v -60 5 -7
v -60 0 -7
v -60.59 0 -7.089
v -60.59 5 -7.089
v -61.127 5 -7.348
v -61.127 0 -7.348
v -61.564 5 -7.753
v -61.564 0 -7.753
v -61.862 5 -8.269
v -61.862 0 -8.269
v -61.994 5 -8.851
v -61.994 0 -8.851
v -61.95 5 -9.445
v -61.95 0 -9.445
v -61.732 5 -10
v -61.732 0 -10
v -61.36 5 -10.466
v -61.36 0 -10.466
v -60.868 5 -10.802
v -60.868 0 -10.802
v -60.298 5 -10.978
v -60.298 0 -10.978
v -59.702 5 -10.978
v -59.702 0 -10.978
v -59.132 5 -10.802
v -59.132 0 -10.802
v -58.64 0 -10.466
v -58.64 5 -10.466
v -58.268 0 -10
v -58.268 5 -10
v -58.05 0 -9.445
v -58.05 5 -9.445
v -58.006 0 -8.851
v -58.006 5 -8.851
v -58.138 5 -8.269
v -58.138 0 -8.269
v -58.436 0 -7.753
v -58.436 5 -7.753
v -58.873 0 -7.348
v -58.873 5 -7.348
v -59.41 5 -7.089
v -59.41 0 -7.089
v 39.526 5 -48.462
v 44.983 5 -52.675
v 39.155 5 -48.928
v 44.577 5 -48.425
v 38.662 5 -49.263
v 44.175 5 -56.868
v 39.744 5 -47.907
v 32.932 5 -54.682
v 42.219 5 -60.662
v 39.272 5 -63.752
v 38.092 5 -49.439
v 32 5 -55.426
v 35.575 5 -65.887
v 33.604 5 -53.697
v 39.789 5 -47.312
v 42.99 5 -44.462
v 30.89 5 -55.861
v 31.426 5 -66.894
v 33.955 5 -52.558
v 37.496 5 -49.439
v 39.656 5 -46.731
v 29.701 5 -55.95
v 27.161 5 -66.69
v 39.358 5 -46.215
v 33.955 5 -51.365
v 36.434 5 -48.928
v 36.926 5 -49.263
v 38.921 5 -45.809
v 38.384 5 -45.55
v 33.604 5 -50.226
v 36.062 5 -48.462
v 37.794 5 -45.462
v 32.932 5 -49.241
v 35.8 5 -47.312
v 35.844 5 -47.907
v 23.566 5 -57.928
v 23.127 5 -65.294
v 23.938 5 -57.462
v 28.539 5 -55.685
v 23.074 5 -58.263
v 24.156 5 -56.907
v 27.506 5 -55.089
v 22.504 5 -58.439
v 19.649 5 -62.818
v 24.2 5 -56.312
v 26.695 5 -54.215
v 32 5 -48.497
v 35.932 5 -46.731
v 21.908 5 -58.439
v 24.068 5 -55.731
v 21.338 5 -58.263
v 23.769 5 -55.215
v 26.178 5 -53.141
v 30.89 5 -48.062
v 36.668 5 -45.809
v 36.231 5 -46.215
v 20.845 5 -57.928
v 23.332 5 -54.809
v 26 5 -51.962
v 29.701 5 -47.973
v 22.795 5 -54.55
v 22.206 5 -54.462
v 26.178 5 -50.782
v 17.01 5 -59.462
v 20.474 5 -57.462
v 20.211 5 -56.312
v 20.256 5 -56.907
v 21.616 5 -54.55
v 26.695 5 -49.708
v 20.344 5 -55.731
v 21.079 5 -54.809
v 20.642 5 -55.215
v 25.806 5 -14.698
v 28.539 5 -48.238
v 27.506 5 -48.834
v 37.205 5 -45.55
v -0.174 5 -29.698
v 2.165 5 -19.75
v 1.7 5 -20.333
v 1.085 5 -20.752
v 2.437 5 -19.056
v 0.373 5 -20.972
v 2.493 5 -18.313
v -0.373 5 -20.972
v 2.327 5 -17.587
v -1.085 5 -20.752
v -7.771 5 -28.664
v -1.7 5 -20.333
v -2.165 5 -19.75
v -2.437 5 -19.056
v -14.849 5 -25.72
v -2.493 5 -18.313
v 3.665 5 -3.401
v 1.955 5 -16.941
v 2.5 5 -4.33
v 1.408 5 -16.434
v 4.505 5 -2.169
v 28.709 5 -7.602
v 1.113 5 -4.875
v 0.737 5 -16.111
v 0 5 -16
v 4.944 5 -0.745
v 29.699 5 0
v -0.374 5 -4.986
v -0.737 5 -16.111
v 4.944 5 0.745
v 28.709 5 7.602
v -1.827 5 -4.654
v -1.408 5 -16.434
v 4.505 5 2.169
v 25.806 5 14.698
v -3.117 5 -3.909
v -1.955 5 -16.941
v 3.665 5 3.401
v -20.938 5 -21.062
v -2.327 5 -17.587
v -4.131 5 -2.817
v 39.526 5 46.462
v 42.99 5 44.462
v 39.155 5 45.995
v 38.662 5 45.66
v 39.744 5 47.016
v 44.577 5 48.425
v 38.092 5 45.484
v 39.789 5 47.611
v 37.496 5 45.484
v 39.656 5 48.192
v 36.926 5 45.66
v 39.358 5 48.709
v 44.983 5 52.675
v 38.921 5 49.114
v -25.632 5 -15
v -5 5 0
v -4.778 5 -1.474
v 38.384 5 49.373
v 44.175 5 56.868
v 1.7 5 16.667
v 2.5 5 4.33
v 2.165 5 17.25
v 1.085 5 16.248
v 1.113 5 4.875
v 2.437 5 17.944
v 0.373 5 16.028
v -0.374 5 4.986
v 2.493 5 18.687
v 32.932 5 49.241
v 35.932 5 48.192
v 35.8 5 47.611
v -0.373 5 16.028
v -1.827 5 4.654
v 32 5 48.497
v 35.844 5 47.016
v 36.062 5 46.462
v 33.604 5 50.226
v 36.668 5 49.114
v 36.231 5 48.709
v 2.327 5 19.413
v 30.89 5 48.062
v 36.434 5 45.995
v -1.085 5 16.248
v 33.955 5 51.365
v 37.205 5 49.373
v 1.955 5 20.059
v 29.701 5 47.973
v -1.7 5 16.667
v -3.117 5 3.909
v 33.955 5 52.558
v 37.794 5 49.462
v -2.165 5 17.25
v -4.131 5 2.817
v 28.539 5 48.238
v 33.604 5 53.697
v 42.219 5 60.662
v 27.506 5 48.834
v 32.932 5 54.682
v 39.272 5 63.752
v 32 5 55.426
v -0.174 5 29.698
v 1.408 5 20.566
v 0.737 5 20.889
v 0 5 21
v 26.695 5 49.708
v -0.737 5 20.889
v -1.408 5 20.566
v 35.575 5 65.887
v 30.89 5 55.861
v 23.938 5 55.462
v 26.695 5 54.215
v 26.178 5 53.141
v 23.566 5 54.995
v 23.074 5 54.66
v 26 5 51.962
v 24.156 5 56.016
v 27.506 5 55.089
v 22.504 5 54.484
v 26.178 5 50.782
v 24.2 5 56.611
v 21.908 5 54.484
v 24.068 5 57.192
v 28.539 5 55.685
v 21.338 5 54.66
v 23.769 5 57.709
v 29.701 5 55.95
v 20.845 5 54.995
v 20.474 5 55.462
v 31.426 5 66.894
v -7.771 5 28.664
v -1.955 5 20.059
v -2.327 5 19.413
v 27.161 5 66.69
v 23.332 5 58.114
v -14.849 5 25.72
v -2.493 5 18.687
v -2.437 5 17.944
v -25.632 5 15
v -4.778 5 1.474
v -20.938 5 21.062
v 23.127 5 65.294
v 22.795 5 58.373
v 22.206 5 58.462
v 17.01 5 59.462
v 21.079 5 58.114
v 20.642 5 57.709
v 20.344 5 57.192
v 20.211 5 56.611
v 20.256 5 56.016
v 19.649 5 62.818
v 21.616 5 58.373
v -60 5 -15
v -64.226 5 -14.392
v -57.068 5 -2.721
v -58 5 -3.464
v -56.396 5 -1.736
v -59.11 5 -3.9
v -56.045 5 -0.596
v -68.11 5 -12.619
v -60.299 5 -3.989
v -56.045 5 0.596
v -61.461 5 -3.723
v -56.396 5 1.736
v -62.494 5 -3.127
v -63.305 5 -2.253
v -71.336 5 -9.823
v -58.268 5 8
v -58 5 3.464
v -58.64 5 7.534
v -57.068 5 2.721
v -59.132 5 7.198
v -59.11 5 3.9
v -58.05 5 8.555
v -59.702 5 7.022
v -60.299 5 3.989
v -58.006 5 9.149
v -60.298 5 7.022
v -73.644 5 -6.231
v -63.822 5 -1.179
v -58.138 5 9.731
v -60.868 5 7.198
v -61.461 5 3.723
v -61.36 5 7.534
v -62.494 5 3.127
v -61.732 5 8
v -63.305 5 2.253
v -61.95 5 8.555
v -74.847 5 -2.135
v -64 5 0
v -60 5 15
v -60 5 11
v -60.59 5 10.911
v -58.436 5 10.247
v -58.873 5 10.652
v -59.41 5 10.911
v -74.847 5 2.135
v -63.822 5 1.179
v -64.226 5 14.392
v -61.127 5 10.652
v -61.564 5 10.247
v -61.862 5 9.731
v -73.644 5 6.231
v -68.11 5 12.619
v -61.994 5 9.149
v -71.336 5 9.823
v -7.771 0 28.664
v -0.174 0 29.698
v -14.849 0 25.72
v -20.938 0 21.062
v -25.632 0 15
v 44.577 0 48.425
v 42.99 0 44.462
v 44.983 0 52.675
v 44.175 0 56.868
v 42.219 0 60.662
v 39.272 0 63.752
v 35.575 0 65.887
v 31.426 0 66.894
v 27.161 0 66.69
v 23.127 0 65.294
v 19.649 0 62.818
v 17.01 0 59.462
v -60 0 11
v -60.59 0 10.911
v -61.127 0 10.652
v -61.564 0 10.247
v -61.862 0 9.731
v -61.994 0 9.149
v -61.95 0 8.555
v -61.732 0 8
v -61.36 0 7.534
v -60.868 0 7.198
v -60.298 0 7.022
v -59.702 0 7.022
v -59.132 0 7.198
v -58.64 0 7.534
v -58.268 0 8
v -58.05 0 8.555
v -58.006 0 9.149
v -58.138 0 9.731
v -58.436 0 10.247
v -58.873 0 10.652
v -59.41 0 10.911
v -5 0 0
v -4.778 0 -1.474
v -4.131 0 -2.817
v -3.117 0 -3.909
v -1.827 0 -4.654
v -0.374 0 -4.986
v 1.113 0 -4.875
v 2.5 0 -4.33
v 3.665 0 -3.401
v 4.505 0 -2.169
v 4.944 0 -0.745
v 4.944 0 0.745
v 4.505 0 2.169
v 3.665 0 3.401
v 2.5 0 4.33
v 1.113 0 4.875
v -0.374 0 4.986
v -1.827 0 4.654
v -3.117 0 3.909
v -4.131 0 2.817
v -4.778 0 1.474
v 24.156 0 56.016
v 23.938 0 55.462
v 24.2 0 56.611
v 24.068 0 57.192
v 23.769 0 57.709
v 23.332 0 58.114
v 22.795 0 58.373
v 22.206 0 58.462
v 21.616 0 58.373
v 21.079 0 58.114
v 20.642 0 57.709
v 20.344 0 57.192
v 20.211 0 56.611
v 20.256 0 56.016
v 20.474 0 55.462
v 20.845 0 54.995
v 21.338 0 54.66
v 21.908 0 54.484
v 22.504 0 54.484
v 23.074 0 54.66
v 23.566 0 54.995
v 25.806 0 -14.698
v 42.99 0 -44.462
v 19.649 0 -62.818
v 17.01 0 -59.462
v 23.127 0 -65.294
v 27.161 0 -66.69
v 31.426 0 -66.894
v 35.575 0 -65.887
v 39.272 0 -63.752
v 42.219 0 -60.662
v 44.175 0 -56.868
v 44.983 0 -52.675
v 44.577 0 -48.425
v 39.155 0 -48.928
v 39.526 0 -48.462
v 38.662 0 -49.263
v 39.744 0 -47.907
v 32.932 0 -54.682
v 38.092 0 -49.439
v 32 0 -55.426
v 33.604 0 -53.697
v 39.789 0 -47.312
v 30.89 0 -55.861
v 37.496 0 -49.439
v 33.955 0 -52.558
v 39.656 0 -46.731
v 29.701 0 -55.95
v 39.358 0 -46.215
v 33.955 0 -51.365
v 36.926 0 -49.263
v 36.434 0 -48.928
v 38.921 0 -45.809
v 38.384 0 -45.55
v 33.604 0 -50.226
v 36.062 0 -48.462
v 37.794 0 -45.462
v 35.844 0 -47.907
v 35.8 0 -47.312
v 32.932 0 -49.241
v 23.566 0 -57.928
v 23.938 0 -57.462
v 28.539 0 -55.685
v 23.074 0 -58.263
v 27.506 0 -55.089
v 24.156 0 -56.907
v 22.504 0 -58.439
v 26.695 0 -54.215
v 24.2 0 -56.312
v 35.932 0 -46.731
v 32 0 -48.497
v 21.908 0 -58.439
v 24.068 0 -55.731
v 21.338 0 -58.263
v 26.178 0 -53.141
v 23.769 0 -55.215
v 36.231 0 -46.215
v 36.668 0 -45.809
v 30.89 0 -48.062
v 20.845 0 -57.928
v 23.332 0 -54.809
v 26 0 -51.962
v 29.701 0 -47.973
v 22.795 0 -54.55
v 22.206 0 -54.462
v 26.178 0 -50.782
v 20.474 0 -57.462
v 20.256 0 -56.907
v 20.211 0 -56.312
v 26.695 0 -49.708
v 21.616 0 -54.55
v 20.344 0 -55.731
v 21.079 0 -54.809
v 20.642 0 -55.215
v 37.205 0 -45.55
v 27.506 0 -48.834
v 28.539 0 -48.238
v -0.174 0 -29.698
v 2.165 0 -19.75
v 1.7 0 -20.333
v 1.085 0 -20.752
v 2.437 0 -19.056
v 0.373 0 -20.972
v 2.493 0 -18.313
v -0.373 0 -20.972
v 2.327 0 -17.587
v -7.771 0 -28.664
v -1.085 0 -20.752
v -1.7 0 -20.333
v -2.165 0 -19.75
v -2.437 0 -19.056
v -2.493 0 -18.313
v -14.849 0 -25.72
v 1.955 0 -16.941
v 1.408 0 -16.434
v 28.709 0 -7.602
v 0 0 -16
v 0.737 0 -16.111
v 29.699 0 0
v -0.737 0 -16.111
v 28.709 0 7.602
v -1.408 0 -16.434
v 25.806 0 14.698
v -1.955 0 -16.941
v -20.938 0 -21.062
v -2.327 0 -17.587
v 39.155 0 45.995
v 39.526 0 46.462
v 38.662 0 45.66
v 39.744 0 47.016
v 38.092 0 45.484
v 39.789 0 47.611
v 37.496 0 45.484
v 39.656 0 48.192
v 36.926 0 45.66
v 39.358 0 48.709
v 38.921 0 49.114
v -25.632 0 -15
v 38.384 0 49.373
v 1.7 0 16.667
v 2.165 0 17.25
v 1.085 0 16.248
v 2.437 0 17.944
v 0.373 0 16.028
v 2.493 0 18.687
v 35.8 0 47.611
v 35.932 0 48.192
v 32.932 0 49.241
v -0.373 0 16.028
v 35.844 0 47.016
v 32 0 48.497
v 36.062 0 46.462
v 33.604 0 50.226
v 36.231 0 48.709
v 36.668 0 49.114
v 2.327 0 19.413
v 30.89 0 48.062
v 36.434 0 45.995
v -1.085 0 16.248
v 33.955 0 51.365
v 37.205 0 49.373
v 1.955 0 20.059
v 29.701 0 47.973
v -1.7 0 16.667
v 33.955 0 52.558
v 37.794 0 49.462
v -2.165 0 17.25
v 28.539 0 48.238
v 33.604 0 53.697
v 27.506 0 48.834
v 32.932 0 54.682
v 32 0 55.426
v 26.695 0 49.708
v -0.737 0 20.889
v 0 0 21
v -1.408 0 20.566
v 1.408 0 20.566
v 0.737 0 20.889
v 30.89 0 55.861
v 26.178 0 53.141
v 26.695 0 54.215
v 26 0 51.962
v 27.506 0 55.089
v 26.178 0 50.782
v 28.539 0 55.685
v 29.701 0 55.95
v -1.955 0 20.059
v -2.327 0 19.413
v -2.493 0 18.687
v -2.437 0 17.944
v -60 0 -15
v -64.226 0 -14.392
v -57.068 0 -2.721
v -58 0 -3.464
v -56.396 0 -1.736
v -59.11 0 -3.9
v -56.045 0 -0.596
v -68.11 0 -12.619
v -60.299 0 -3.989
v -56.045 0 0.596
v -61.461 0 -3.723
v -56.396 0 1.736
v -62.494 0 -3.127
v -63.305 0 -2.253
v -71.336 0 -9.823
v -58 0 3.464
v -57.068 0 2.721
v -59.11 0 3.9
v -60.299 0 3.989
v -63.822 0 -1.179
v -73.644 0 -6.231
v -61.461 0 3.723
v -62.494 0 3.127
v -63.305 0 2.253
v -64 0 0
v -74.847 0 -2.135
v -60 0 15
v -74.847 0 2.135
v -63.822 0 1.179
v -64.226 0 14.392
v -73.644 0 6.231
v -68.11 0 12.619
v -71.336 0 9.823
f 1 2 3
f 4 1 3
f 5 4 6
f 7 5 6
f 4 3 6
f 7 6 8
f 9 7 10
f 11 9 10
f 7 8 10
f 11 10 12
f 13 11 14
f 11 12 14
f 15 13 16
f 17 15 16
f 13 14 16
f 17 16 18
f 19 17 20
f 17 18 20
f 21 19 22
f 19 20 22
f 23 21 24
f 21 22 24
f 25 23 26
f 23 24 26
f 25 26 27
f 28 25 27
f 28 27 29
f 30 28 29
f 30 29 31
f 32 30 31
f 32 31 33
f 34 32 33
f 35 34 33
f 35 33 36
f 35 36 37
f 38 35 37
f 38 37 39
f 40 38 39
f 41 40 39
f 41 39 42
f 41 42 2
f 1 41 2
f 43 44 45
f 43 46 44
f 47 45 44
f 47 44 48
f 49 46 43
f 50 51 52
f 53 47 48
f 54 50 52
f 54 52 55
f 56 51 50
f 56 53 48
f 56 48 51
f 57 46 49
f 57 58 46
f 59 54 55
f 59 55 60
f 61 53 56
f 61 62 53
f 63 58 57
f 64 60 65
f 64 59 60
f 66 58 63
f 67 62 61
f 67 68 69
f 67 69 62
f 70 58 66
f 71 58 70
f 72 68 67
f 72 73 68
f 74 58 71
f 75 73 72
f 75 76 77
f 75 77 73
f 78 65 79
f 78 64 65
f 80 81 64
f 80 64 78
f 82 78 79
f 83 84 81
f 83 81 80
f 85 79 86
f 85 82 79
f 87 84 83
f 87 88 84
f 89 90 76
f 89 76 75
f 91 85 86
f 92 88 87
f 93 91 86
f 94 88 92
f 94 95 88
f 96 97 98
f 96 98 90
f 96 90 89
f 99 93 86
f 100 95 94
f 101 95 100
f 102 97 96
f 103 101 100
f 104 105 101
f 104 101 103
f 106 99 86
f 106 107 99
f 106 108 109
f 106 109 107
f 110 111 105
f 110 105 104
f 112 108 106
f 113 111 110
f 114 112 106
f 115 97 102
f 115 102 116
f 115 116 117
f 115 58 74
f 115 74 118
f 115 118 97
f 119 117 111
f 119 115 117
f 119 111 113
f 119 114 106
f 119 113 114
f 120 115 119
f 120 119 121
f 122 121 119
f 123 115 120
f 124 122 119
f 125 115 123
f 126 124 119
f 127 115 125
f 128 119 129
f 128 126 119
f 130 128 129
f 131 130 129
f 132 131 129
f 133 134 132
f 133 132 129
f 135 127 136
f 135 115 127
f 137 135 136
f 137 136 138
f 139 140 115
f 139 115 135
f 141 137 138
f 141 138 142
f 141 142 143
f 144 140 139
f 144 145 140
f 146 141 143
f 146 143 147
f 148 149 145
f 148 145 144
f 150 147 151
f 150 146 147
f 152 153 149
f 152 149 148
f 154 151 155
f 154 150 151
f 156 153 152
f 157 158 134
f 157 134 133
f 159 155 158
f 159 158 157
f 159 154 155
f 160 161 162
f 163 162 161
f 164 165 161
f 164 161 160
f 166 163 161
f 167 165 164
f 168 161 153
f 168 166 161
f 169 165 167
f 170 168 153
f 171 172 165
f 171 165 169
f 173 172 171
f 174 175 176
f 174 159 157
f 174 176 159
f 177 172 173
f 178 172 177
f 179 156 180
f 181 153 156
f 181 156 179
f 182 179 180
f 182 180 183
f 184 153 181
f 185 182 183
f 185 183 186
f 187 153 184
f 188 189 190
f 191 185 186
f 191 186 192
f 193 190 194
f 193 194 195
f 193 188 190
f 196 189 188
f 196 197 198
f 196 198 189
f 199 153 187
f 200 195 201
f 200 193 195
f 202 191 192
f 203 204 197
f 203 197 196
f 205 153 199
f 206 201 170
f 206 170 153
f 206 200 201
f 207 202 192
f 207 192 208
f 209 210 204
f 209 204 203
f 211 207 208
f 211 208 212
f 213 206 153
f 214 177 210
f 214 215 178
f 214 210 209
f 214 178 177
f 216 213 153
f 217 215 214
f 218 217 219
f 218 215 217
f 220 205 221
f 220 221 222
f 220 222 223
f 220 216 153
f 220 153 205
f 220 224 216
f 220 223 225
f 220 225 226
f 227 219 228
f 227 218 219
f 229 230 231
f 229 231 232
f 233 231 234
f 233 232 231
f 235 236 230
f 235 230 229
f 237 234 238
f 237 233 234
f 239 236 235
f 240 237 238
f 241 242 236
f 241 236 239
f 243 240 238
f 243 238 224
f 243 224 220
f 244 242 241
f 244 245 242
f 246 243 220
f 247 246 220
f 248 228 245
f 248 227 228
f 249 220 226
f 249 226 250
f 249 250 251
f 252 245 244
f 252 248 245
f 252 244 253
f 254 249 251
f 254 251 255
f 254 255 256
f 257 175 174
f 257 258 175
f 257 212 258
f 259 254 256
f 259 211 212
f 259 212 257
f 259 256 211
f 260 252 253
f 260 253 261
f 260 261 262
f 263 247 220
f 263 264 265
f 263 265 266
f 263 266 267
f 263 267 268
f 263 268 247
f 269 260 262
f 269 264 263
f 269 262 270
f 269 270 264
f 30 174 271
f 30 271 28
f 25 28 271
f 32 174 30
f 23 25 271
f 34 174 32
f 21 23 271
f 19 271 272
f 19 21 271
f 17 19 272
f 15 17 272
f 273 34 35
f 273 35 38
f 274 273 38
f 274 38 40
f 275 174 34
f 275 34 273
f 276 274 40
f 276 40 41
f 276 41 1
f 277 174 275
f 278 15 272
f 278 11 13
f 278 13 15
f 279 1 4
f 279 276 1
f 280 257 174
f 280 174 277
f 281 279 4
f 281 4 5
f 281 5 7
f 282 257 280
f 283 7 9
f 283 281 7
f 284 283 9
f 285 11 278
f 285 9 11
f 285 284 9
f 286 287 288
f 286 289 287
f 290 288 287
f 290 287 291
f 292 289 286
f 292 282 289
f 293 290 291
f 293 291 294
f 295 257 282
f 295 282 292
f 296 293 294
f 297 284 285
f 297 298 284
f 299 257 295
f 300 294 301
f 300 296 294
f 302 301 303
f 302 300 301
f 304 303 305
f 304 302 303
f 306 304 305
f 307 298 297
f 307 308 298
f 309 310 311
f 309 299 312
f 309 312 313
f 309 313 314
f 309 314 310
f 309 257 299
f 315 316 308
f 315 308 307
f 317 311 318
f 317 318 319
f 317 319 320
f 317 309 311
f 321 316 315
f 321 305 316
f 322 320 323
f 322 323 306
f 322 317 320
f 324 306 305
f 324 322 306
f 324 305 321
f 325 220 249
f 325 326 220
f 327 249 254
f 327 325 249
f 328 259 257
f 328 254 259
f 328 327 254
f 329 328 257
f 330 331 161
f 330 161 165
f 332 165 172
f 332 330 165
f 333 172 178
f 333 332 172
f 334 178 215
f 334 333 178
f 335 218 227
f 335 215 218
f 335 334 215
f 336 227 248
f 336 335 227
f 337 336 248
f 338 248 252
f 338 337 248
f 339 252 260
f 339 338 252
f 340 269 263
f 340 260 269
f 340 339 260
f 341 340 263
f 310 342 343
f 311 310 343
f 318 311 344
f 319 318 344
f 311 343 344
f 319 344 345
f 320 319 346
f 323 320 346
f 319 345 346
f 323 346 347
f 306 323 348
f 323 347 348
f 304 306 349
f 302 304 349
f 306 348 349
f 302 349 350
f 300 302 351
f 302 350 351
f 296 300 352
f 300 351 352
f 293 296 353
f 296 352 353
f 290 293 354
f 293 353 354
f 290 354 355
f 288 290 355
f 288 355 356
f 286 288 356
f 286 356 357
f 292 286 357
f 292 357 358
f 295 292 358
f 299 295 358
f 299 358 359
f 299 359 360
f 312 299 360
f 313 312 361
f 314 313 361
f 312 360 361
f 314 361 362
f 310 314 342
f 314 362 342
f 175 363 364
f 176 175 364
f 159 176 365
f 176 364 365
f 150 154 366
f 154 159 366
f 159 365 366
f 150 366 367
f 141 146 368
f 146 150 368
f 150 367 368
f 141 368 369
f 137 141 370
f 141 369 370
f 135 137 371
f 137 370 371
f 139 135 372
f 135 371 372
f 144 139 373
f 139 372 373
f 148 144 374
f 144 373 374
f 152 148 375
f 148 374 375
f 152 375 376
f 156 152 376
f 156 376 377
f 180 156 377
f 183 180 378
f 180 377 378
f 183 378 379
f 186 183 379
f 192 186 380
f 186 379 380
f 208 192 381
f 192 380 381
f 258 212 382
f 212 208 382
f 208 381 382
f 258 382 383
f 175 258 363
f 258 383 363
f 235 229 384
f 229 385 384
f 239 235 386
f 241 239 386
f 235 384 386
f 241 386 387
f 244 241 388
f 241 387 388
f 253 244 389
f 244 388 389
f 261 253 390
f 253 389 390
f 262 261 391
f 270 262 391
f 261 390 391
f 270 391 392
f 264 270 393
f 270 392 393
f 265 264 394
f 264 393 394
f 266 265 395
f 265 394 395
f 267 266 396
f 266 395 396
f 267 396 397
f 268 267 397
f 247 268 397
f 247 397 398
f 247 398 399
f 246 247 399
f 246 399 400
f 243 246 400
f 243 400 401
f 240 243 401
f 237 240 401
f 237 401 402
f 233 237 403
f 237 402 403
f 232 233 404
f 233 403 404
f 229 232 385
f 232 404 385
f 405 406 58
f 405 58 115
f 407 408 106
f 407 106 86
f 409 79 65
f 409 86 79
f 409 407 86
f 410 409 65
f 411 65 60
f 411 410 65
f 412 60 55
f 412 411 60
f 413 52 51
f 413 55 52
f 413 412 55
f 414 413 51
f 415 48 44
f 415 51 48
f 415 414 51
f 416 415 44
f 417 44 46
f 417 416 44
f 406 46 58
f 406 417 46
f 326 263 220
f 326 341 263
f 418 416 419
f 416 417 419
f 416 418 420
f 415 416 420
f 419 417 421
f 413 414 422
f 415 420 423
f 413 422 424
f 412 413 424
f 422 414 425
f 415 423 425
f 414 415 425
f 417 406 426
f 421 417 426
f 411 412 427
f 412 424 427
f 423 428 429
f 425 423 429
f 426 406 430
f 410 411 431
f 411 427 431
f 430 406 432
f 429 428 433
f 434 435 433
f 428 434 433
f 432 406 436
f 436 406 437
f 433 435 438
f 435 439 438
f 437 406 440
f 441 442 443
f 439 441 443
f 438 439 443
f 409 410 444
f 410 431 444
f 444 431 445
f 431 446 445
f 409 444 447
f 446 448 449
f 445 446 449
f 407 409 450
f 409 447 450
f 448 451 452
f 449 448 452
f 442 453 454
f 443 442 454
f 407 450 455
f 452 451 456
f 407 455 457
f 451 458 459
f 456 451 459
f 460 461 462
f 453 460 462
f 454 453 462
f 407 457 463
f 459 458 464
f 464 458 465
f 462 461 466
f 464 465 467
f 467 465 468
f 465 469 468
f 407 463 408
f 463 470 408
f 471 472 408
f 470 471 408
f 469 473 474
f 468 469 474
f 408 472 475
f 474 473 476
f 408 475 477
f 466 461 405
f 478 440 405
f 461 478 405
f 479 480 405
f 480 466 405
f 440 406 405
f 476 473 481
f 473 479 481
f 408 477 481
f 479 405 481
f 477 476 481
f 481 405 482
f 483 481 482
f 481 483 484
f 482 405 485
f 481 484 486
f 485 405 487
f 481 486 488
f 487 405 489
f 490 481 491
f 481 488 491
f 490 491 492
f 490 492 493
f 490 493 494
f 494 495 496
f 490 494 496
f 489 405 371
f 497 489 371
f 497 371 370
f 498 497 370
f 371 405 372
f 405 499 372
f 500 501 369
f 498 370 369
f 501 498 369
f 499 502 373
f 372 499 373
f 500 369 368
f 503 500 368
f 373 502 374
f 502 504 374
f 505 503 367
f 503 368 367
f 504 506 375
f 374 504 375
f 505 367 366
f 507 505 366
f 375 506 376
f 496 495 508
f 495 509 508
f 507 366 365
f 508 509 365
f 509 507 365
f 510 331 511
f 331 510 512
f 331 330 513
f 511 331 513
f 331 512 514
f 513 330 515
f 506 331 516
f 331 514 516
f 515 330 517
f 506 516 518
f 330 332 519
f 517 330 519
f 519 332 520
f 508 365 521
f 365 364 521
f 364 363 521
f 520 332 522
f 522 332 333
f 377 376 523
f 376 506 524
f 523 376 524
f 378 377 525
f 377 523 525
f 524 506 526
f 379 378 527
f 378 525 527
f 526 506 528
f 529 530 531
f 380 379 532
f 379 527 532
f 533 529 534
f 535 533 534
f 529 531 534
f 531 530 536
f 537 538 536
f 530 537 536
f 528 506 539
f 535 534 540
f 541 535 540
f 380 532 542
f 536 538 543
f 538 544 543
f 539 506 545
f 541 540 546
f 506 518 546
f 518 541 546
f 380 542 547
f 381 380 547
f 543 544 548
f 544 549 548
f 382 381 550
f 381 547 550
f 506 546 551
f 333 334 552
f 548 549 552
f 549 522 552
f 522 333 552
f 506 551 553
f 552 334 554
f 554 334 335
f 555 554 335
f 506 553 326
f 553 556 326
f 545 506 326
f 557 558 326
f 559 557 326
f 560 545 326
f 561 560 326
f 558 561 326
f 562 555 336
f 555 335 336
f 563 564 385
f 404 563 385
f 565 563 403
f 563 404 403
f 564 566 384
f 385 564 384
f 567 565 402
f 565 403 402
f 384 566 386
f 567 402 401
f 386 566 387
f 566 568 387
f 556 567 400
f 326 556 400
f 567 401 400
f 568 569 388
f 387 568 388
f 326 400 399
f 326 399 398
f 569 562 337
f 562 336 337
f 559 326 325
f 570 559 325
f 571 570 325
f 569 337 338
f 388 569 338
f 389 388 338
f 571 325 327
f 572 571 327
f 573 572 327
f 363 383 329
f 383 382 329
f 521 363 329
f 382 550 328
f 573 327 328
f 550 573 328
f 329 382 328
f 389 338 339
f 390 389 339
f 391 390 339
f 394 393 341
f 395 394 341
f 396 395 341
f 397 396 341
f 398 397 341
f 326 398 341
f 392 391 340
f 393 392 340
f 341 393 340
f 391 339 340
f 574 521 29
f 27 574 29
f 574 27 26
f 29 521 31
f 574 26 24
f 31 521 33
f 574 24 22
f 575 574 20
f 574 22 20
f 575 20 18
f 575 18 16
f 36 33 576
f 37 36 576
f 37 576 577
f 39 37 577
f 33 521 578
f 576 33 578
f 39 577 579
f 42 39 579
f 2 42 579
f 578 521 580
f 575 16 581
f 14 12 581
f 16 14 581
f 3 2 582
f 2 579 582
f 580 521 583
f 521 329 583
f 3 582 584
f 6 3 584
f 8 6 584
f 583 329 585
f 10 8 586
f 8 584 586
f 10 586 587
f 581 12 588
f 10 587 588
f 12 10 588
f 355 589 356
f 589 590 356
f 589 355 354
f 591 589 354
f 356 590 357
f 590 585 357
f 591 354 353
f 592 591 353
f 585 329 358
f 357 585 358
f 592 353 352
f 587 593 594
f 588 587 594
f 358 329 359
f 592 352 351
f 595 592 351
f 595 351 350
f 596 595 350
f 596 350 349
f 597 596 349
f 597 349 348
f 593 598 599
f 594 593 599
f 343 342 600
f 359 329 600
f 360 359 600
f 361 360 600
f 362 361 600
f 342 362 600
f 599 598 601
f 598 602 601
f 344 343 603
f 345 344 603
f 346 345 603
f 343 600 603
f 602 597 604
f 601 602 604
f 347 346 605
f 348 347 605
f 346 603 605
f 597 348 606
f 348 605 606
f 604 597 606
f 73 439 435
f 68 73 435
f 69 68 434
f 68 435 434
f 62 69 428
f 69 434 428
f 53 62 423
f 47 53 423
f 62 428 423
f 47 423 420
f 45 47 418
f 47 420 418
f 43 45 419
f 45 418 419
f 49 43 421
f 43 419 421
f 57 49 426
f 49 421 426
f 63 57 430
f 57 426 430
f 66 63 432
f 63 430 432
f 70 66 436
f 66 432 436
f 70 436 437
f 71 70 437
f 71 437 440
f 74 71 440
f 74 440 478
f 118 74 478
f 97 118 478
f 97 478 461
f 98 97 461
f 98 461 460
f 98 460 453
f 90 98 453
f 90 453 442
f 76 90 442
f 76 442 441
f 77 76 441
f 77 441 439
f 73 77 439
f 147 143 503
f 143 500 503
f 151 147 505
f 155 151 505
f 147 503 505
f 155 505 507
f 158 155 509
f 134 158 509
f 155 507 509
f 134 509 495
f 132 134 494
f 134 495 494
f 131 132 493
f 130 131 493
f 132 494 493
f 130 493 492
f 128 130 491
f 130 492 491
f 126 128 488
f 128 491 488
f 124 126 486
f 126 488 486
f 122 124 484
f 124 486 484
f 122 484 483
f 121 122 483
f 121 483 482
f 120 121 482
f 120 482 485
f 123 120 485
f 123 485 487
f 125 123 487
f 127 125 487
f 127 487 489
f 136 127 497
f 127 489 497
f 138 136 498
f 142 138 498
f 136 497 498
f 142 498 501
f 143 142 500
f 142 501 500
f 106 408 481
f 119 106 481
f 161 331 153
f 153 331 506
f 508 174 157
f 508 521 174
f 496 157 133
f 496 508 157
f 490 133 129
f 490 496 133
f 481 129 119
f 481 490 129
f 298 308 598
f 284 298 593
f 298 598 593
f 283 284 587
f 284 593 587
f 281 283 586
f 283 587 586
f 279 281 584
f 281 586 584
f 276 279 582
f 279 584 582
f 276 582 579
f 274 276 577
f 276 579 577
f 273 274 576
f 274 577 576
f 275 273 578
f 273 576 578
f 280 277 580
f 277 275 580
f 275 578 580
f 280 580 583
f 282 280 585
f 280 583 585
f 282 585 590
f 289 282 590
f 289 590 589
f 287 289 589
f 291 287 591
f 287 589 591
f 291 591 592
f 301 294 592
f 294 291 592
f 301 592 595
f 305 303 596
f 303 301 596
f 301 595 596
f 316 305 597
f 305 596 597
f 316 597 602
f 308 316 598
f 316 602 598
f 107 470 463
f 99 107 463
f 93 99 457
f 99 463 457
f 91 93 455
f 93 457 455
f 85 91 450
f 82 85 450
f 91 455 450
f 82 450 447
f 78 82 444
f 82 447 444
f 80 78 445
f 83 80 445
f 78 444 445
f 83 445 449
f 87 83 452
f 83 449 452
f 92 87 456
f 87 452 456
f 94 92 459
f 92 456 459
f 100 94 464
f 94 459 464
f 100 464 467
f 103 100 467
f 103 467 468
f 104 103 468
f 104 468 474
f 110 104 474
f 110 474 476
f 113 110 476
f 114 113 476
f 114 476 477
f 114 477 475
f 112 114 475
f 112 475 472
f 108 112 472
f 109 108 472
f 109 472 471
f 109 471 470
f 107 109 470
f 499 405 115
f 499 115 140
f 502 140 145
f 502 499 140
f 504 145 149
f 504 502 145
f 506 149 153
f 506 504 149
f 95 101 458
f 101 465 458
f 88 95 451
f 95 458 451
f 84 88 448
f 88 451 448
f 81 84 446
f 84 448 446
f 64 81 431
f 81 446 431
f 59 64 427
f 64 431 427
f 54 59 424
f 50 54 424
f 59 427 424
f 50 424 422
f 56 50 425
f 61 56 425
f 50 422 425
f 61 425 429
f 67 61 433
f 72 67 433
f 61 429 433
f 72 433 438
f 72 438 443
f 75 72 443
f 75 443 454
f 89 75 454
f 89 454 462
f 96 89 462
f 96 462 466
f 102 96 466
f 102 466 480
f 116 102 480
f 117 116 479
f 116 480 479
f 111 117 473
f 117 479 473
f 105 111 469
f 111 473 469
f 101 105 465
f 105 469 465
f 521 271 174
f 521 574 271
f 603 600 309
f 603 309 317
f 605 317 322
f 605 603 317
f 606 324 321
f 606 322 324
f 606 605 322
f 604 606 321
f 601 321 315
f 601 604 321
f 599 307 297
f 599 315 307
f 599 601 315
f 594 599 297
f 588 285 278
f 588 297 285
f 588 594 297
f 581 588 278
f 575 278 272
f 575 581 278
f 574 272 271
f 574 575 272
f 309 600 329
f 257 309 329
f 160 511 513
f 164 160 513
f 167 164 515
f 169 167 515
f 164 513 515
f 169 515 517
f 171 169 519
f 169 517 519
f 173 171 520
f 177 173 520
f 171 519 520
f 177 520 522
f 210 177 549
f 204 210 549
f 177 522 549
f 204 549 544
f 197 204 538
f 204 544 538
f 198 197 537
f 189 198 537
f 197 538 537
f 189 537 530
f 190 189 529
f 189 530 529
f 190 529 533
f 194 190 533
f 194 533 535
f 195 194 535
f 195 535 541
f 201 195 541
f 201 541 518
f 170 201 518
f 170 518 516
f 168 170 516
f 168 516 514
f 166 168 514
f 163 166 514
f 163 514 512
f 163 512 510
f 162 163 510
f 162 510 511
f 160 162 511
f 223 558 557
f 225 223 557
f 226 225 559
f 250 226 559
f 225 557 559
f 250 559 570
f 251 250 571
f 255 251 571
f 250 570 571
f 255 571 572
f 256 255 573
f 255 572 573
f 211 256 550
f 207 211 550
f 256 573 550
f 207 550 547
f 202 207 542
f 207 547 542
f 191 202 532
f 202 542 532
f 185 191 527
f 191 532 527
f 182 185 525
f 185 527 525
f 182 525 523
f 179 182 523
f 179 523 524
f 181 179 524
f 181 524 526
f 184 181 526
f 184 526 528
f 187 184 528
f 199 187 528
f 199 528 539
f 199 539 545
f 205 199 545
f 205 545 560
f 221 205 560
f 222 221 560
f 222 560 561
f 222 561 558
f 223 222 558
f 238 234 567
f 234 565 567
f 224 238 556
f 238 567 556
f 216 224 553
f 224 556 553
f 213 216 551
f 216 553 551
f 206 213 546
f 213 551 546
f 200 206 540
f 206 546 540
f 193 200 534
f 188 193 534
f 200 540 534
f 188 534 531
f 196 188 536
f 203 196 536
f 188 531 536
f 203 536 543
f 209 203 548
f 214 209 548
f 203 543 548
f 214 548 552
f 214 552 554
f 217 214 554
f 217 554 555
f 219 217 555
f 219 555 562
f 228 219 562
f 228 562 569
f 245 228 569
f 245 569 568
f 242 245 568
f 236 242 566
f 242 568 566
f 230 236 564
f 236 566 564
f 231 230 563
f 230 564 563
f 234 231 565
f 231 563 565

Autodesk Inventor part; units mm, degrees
ref_plane "YZ Plane" through (0, 0, 0) normal (1, 0, 0) x (0, 1, 0)
ref_plane "XZ Plane" through (0, 0, 0) normal (0, 1, 0) x (-1, 0, 0)
ref_plane "XY Plane" through (0, 0, 0) normal (0, 0, 1) x (1, 0, 0)
sketch "Sketch1" plane through (0, 0, 0) normal (0, 1, 0) x (-1, 0, 0)
  circle A0 centre (0, 0) radius 60
  circle A1 centre (60, 0) radius 4
  circle A2 centre (-30, 51.9615) radius 4
  circle A3 centre (-30, -51.9615) radius 4
  circle A4 centre (-30, 51.9615) radius 15
  circle A5 centre (-30, -51.9615) radius 15
  circle A6 centre (60, 0) radius 15
  line L0 (21, -21) -> (-21, -21)
  line L1 (-21, -21) -> (-21, 21)
  line L2 (-21, 21) -> (21, 21)
  line L3 (21, 21) -> (21, -21)
  line L4 (21, -21) -> (-21, 21) construction
  line L5 (-21, -21) -> (21, 21) construction
  circle A7 centre (0, 0) radius 5
  line L6 (60, 15) -> (25.632, 15)
  line L7 (60, -15) -> (25.632, -15)
  circle A8 centre (0, 0) radius 29.6985
  circle A9 centre (28.3546, 20) radius 5
  circle A10 centre (28.3546, -20) radius 5
  circle A11 centre (-31.4978, 14.5558) radius 5
  line L8 (-42.9904, 44.4615) -> (-25.8064, 14.698)
  line L9 (-17.0096, 59.4615) -> (0.1744, 29.698)
  circle A12 centre (3.1432, 34.5558) radius 5
  circle A13 centre (3.1432, -34.5558) radius 5
  line L10 (-17.0096, -59.4615) -> (0.1744, -29.698)
  line L11 (-42.9904, -44.4615) -> (-25.8064, -14.698)
  circle A14 centre (-31.4978, -14.5558) radius 5
  point P0 (16, -16)
  point P1 (16, 16)
  point P2 (-16, 16)
  point P3 (-16, -16)
  point P4 (-16.174, 57.7789)
  point P5 (-41.951, 42.8966)
  point P6 (-42.0378, 42.8115)
  point P7 (-25.8064, 14.698)
  point P8 (-25.8064, -14.698)
  point P9 (-42.0378, -42.8115)
  point P10 (-41.951, -42.8966)
  point P11 (-16.174, -57.7789)
  point P12 (-16.057, -57.8115)
  point P13 (58.0948, -15)
  point P14 (58.125, -14.8824)
  point P15 (58.125, 14.8824)
  point P16 (58.0948, 15)
  point P17 (-16.057, 57.8115)
  point P18 (-26.4712, -53.8449)
  point P19 (-33.3955, -49.8472)
  dimension "d0" = 120
  dimension "d2" = 8
  dimension "d5" = 360
  dimension "d7" = 30
  dimension "d8" = 30
  dimension "d9" = 30
  dimension "d10" = 42
  dimension "d11" = 42
  dimension "d12" = 10
  dimension "d13" = 32
  dimension "d14" = 16
  dimension "d15" = 16
  dimension "d16" = 32
  dimension "d17" = 10
  dimension "d18" = 10
  dimension "d21" = 360
extrude "Extrusion1" add sketch "Sketch1" along normal blind 5 contours A1 A0 A6 | A0 A6 A1 | A6 A0 L7 A8 L6 | A0 L6 A6 | A6 L7 A0 | L9 A8 L8 A0 A4 | A0 A4 L9 | L10 A5 A0 | A0 A5 L11 A8 L10 | A4 A0 A2 | A0 A2 A4 | A8 L3 | A5 A0 A3 | A0 A3 A5 | A4 A0 L8 | A8 L2 | L3 L0 L1 L2 | L11 A0 A5 | A8 L0 | L1 A8
sketch "Sketch3" plane through (0, 5, 0) normal (0, 1, 0) x (1, 0, 0)
  point P0 (0, 0)
  point P1 (0, 18.5)
  point P2 (0, -18.5)
  dimension "d36" = 37
  dimension "d37" = 18.5
hole "Hole2" at (0, 5, -18.5) at (0, 5, 18.5) direction (0, -1, 0) diameter 5 end through all
sketch "Sketch4" plane through (0, 5, 0) normal (0, 1, 0) x (1, 0, 0)
  circle A0 centre (30, 51.9615) radius 4 projected
  circle A1 centre (-60, 0) radius 4 projected
  circle A2 centre (30, -51.9615) radius 4 projected
  point P0 (0, 0)
  point P1 (-60, -9)
  point P2 (-60, 9)
  point P3 (26.4712, 53.8449)
  point P4 (33.3955, 49.8472)
  dimension "d45" = 18
  dimension "d46" = 9
hole "Hole3" at (-60, 5, 9) at (-60, 5, -9) direction (0, -1, 0) diameter 4 end through all
pattern_circular "Circular Pattern1" count 3 over 360 about axis through (0, 0, 0) along (0, 1, 0) of "Hole3"
properties part number "De_Tren_Cung" material "Aluminum 6061"
